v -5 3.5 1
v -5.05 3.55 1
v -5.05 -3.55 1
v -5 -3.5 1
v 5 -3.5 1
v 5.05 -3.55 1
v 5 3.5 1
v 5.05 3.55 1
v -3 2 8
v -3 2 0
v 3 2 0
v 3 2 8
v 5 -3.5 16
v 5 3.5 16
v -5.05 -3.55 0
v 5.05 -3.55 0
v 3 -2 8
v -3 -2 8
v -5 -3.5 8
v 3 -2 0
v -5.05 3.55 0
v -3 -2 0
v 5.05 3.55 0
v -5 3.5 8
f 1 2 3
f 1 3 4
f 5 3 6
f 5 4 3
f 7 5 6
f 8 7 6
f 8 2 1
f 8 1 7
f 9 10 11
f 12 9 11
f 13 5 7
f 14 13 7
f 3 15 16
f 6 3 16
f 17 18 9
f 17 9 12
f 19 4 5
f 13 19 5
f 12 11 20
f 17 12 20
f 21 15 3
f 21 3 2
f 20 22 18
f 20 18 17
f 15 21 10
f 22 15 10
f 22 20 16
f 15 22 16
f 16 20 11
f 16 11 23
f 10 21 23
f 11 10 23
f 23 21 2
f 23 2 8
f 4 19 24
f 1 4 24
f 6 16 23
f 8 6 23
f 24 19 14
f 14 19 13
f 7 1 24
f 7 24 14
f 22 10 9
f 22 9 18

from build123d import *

# Parameters (mm, degrees)
SKETCH_W        = 10.1
SKETCH_H        = 7.1
PAD_DEPTH       = 1
SKETCH001_W     = 10
SKETCH001_H     = 7
PAD001_DEPTH    = 15
POCKET_DEPTH    = 7.051
SKETCH003_W     = 6
SKETCH003_H     = 4
POCKET001_DEPTH = 8


with BuildPart() as part:
    # Sketch → Pad (new body)
    with BuildSketch(Plane.XY):
        Rectangle(SKETCH_W, SKETCH_H)
    extrude(amount=PAD_DEPTH)

    # Sketch001 → Pad001 (new body)
    with BuildSketch(Plane.XY.offset(1)):
        Rectangle(SKETCH001_W, SKETCH001_H)
    extrude(amount=PAD001_DEPTH)

    # Sketch002 → Pocket (cut, through all)
    with BuildSketch(Plane.XZ.offset(3.5)):
        Polygon((5, 16), (-20, 16), (-20, -4), align=None)
    extrude(amount=-POCKET_DEPTH, mode=Mode.SUBTRACT)

    # Sketch003 → Pocket001 (cut)
    with BuildSketch(Plane(origin=(0, 0, 0), x_dir=(1, 0, 0), z_dir=(0, 0, -1))):
        Rectangle(SKETCH003_W, SKETCH003_H)
    extrude(amount=-POCKET001_DEPTH, mode=Mode.SUBTRACT)


solid = part.part
